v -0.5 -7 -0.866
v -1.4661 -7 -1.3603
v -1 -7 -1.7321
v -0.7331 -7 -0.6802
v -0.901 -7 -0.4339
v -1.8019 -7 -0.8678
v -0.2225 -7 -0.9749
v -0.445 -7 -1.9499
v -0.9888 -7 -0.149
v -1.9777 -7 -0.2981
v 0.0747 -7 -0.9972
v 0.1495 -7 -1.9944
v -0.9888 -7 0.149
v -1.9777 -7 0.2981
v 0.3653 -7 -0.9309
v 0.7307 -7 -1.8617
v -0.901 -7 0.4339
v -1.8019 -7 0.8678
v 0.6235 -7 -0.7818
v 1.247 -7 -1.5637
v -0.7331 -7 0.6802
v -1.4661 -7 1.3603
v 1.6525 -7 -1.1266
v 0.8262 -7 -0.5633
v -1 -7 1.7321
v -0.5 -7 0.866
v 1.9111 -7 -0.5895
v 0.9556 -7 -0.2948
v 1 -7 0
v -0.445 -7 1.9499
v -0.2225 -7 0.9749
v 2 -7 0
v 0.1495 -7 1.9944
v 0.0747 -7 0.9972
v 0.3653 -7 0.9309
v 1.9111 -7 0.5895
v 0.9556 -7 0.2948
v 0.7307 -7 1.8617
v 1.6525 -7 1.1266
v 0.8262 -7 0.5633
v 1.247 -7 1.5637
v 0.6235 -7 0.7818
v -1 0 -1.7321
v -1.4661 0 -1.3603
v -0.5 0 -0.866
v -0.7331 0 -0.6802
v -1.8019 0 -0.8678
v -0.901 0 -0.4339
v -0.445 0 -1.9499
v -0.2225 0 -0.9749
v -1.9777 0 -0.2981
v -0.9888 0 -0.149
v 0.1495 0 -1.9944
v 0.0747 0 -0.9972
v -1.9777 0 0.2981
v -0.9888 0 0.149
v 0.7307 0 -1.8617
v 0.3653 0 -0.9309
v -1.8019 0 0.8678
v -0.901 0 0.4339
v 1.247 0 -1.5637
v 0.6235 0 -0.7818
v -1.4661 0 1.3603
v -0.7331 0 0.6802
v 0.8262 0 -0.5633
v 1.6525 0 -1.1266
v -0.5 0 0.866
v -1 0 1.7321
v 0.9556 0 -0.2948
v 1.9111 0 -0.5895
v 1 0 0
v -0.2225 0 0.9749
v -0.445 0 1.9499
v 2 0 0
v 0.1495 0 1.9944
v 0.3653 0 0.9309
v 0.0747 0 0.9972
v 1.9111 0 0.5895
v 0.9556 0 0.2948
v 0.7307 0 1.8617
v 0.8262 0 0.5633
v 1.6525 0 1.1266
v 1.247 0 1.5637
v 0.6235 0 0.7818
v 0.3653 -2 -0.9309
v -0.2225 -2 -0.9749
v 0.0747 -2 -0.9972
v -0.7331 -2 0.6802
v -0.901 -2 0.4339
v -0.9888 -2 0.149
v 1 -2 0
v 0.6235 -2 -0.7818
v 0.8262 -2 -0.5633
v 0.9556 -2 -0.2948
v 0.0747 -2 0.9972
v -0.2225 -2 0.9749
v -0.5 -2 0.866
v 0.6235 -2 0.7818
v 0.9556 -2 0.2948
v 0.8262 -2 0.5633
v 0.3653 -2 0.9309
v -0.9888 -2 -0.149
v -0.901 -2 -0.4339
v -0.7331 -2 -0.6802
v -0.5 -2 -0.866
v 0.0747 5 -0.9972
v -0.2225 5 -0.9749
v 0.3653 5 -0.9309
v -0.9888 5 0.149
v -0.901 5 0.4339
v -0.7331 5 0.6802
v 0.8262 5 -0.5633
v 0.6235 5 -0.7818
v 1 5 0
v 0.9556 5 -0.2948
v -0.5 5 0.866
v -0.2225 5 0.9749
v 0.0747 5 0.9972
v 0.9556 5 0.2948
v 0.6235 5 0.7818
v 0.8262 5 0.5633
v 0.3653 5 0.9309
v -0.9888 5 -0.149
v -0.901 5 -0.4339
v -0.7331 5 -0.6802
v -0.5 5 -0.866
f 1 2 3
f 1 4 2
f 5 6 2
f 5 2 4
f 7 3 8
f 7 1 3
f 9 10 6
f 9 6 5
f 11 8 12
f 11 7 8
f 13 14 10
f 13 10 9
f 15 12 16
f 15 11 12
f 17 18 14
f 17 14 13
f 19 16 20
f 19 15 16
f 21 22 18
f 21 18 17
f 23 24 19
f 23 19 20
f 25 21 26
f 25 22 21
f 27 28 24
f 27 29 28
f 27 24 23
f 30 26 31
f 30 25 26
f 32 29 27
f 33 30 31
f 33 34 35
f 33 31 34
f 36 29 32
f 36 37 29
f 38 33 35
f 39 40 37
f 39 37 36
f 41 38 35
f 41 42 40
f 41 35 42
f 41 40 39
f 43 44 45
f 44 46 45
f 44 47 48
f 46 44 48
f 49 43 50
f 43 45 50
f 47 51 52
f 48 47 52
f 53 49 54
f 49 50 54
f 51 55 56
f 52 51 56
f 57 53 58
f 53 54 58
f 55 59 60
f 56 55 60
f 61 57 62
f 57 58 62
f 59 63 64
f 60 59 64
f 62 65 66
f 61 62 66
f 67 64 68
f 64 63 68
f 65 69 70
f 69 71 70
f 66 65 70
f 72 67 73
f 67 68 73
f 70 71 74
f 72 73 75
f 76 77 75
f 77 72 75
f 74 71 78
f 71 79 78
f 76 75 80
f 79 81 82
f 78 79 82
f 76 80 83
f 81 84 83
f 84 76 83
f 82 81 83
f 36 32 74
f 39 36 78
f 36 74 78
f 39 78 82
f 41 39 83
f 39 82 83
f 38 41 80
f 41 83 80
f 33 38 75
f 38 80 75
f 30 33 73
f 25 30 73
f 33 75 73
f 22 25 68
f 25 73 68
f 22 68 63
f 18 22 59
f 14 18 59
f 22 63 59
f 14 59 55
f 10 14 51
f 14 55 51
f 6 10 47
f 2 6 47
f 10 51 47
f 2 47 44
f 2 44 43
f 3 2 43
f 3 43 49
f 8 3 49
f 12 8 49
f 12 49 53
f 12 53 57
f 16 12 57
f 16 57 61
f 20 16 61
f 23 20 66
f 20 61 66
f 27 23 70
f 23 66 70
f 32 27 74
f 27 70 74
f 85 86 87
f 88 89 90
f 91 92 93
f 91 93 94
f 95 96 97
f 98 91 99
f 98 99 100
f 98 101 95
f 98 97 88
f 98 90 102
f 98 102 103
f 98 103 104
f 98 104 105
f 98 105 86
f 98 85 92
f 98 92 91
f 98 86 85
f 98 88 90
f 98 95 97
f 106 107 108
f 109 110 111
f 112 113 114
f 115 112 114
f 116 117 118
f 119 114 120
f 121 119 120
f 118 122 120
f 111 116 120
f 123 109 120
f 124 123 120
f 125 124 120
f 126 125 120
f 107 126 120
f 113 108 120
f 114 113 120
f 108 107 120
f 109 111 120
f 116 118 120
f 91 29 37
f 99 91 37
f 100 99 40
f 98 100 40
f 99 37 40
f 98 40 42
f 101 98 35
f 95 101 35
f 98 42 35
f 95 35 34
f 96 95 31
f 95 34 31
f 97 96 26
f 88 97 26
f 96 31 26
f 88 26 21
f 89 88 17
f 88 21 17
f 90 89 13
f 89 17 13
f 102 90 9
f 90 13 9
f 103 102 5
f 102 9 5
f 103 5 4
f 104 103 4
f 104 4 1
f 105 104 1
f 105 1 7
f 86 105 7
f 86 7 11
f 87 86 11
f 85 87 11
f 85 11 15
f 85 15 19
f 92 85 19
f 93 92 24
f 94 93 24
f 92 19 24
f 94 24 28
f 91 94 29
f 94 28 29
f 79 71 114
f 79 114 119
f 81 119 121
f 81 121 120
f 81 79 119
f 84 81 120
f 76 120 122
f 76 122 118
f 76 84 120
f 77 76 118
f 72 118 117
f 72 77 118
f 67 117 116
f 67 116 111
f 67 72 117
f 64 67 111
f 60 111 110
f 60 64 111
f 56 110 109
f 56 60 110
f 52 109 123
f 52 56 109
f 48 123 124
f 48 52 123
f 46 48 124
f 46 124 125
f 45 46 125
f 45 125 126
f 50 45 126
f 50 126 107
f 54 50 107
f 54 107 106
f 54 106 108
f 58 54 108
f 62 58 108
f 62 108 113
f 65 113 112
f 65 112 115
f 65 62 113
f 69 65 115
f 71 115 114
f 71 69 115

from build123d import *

# Parameters (mm, degrees)
F0_R     = 2
F1_DEPTH = 7
F2_R     = 1
F3_DEPTH = 5
F4_R     = 1
F5_DEPTH = 5


with BuildPart() as f1:
    # F0 (on Front) → F1 (new body)
    with BuildSketch(Plane.XZ):
        Circle(F0_R)
    extrude(amount=F1_DEPTH)

    # F2 (on Front) → F3 (join)
    with BuildSketch(Plane.XZ):
        Circle(F2_R)
    extrude(amount=-F3_DEPTH)

    # F4 (on face) → F5 (cut)
    with BuildSketch(Plane.XZ.offset(7)):
        Circle(F4_R)
    extrude(amount=-F5_DEPTH, mode=Mode.SUBTRACT)


solid = f1.part
